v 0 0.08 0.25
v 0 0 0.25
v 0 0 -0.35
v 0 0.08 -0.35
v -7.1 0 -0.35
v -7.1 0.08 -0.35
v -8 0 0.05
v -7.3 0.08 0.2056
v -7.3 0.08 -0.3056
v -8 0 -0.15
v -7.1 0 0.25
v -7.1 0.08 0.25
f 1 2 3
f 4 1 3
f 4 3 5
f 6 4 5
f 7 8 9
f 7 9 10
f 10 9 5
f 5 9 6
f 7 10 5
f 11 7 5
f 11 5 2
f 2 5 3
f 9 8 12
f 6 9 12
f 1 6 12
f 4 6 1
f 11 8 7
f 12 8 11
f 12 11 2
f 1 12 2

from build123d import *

# Parameters (mm, degrees)
BOSS_EXTRUDE1_DEPTH = 0.08
CUT_EXTRUDE3_DEPTH  = 9.022867318
CUT_EXTRUDE4_DEPTH  = 8.325052901


with BuildPart() as part:
    # Sketch1 → Boss-Extrude1 (new body)
    with BuildSketch(Plane(origin=(0, 0, 0), x_dir=(1, 0, 0), z_dir=(0, 1, 0))):
        Polygon((0, -0.25), (0, 0.35), (-4, 0.35), (-8, 0.35), (-8, -0.25), (-4, -0.25), align=None)
    extrude(amount=BOSS_EXTRUDE1_DEPTH)

    # Sketch5 → Cut-Extrude3 (cut, through all)
    with BuildSketch(Plane.XY.offset(0.25)):
        Polygon((-8, 0), (-8, 0.08), (-7.3, 0.08), align=None)
    extrude(amount=-CUT_EXTRUDE3_DEPTH, mode=Mode.SUBTRACT)

    # 3DSketch1 → Cut-Extrude4 (cut, through all)
    with BuildSketch(Plane(origin=(-7.3, 0.08, -0.35), x_dir=(-0.7592566023652966, 0, 0.6507913734559685), z_dir=(0, 1, 0))):
        Polygon((0.238623504, 0.585712236), (0.921954446, 0), (0.791796171, -0.15185132), align=None)
        Polygon((-0.15185132, 0.130158275), (0.531479622, -0.455553961), (0.661637896, -0.303702641), align=None)
    extrude(amount=-CUT_EXTRUDE4_DEPTH, mode=Mode.SUBTRACT)


solid = part.part
